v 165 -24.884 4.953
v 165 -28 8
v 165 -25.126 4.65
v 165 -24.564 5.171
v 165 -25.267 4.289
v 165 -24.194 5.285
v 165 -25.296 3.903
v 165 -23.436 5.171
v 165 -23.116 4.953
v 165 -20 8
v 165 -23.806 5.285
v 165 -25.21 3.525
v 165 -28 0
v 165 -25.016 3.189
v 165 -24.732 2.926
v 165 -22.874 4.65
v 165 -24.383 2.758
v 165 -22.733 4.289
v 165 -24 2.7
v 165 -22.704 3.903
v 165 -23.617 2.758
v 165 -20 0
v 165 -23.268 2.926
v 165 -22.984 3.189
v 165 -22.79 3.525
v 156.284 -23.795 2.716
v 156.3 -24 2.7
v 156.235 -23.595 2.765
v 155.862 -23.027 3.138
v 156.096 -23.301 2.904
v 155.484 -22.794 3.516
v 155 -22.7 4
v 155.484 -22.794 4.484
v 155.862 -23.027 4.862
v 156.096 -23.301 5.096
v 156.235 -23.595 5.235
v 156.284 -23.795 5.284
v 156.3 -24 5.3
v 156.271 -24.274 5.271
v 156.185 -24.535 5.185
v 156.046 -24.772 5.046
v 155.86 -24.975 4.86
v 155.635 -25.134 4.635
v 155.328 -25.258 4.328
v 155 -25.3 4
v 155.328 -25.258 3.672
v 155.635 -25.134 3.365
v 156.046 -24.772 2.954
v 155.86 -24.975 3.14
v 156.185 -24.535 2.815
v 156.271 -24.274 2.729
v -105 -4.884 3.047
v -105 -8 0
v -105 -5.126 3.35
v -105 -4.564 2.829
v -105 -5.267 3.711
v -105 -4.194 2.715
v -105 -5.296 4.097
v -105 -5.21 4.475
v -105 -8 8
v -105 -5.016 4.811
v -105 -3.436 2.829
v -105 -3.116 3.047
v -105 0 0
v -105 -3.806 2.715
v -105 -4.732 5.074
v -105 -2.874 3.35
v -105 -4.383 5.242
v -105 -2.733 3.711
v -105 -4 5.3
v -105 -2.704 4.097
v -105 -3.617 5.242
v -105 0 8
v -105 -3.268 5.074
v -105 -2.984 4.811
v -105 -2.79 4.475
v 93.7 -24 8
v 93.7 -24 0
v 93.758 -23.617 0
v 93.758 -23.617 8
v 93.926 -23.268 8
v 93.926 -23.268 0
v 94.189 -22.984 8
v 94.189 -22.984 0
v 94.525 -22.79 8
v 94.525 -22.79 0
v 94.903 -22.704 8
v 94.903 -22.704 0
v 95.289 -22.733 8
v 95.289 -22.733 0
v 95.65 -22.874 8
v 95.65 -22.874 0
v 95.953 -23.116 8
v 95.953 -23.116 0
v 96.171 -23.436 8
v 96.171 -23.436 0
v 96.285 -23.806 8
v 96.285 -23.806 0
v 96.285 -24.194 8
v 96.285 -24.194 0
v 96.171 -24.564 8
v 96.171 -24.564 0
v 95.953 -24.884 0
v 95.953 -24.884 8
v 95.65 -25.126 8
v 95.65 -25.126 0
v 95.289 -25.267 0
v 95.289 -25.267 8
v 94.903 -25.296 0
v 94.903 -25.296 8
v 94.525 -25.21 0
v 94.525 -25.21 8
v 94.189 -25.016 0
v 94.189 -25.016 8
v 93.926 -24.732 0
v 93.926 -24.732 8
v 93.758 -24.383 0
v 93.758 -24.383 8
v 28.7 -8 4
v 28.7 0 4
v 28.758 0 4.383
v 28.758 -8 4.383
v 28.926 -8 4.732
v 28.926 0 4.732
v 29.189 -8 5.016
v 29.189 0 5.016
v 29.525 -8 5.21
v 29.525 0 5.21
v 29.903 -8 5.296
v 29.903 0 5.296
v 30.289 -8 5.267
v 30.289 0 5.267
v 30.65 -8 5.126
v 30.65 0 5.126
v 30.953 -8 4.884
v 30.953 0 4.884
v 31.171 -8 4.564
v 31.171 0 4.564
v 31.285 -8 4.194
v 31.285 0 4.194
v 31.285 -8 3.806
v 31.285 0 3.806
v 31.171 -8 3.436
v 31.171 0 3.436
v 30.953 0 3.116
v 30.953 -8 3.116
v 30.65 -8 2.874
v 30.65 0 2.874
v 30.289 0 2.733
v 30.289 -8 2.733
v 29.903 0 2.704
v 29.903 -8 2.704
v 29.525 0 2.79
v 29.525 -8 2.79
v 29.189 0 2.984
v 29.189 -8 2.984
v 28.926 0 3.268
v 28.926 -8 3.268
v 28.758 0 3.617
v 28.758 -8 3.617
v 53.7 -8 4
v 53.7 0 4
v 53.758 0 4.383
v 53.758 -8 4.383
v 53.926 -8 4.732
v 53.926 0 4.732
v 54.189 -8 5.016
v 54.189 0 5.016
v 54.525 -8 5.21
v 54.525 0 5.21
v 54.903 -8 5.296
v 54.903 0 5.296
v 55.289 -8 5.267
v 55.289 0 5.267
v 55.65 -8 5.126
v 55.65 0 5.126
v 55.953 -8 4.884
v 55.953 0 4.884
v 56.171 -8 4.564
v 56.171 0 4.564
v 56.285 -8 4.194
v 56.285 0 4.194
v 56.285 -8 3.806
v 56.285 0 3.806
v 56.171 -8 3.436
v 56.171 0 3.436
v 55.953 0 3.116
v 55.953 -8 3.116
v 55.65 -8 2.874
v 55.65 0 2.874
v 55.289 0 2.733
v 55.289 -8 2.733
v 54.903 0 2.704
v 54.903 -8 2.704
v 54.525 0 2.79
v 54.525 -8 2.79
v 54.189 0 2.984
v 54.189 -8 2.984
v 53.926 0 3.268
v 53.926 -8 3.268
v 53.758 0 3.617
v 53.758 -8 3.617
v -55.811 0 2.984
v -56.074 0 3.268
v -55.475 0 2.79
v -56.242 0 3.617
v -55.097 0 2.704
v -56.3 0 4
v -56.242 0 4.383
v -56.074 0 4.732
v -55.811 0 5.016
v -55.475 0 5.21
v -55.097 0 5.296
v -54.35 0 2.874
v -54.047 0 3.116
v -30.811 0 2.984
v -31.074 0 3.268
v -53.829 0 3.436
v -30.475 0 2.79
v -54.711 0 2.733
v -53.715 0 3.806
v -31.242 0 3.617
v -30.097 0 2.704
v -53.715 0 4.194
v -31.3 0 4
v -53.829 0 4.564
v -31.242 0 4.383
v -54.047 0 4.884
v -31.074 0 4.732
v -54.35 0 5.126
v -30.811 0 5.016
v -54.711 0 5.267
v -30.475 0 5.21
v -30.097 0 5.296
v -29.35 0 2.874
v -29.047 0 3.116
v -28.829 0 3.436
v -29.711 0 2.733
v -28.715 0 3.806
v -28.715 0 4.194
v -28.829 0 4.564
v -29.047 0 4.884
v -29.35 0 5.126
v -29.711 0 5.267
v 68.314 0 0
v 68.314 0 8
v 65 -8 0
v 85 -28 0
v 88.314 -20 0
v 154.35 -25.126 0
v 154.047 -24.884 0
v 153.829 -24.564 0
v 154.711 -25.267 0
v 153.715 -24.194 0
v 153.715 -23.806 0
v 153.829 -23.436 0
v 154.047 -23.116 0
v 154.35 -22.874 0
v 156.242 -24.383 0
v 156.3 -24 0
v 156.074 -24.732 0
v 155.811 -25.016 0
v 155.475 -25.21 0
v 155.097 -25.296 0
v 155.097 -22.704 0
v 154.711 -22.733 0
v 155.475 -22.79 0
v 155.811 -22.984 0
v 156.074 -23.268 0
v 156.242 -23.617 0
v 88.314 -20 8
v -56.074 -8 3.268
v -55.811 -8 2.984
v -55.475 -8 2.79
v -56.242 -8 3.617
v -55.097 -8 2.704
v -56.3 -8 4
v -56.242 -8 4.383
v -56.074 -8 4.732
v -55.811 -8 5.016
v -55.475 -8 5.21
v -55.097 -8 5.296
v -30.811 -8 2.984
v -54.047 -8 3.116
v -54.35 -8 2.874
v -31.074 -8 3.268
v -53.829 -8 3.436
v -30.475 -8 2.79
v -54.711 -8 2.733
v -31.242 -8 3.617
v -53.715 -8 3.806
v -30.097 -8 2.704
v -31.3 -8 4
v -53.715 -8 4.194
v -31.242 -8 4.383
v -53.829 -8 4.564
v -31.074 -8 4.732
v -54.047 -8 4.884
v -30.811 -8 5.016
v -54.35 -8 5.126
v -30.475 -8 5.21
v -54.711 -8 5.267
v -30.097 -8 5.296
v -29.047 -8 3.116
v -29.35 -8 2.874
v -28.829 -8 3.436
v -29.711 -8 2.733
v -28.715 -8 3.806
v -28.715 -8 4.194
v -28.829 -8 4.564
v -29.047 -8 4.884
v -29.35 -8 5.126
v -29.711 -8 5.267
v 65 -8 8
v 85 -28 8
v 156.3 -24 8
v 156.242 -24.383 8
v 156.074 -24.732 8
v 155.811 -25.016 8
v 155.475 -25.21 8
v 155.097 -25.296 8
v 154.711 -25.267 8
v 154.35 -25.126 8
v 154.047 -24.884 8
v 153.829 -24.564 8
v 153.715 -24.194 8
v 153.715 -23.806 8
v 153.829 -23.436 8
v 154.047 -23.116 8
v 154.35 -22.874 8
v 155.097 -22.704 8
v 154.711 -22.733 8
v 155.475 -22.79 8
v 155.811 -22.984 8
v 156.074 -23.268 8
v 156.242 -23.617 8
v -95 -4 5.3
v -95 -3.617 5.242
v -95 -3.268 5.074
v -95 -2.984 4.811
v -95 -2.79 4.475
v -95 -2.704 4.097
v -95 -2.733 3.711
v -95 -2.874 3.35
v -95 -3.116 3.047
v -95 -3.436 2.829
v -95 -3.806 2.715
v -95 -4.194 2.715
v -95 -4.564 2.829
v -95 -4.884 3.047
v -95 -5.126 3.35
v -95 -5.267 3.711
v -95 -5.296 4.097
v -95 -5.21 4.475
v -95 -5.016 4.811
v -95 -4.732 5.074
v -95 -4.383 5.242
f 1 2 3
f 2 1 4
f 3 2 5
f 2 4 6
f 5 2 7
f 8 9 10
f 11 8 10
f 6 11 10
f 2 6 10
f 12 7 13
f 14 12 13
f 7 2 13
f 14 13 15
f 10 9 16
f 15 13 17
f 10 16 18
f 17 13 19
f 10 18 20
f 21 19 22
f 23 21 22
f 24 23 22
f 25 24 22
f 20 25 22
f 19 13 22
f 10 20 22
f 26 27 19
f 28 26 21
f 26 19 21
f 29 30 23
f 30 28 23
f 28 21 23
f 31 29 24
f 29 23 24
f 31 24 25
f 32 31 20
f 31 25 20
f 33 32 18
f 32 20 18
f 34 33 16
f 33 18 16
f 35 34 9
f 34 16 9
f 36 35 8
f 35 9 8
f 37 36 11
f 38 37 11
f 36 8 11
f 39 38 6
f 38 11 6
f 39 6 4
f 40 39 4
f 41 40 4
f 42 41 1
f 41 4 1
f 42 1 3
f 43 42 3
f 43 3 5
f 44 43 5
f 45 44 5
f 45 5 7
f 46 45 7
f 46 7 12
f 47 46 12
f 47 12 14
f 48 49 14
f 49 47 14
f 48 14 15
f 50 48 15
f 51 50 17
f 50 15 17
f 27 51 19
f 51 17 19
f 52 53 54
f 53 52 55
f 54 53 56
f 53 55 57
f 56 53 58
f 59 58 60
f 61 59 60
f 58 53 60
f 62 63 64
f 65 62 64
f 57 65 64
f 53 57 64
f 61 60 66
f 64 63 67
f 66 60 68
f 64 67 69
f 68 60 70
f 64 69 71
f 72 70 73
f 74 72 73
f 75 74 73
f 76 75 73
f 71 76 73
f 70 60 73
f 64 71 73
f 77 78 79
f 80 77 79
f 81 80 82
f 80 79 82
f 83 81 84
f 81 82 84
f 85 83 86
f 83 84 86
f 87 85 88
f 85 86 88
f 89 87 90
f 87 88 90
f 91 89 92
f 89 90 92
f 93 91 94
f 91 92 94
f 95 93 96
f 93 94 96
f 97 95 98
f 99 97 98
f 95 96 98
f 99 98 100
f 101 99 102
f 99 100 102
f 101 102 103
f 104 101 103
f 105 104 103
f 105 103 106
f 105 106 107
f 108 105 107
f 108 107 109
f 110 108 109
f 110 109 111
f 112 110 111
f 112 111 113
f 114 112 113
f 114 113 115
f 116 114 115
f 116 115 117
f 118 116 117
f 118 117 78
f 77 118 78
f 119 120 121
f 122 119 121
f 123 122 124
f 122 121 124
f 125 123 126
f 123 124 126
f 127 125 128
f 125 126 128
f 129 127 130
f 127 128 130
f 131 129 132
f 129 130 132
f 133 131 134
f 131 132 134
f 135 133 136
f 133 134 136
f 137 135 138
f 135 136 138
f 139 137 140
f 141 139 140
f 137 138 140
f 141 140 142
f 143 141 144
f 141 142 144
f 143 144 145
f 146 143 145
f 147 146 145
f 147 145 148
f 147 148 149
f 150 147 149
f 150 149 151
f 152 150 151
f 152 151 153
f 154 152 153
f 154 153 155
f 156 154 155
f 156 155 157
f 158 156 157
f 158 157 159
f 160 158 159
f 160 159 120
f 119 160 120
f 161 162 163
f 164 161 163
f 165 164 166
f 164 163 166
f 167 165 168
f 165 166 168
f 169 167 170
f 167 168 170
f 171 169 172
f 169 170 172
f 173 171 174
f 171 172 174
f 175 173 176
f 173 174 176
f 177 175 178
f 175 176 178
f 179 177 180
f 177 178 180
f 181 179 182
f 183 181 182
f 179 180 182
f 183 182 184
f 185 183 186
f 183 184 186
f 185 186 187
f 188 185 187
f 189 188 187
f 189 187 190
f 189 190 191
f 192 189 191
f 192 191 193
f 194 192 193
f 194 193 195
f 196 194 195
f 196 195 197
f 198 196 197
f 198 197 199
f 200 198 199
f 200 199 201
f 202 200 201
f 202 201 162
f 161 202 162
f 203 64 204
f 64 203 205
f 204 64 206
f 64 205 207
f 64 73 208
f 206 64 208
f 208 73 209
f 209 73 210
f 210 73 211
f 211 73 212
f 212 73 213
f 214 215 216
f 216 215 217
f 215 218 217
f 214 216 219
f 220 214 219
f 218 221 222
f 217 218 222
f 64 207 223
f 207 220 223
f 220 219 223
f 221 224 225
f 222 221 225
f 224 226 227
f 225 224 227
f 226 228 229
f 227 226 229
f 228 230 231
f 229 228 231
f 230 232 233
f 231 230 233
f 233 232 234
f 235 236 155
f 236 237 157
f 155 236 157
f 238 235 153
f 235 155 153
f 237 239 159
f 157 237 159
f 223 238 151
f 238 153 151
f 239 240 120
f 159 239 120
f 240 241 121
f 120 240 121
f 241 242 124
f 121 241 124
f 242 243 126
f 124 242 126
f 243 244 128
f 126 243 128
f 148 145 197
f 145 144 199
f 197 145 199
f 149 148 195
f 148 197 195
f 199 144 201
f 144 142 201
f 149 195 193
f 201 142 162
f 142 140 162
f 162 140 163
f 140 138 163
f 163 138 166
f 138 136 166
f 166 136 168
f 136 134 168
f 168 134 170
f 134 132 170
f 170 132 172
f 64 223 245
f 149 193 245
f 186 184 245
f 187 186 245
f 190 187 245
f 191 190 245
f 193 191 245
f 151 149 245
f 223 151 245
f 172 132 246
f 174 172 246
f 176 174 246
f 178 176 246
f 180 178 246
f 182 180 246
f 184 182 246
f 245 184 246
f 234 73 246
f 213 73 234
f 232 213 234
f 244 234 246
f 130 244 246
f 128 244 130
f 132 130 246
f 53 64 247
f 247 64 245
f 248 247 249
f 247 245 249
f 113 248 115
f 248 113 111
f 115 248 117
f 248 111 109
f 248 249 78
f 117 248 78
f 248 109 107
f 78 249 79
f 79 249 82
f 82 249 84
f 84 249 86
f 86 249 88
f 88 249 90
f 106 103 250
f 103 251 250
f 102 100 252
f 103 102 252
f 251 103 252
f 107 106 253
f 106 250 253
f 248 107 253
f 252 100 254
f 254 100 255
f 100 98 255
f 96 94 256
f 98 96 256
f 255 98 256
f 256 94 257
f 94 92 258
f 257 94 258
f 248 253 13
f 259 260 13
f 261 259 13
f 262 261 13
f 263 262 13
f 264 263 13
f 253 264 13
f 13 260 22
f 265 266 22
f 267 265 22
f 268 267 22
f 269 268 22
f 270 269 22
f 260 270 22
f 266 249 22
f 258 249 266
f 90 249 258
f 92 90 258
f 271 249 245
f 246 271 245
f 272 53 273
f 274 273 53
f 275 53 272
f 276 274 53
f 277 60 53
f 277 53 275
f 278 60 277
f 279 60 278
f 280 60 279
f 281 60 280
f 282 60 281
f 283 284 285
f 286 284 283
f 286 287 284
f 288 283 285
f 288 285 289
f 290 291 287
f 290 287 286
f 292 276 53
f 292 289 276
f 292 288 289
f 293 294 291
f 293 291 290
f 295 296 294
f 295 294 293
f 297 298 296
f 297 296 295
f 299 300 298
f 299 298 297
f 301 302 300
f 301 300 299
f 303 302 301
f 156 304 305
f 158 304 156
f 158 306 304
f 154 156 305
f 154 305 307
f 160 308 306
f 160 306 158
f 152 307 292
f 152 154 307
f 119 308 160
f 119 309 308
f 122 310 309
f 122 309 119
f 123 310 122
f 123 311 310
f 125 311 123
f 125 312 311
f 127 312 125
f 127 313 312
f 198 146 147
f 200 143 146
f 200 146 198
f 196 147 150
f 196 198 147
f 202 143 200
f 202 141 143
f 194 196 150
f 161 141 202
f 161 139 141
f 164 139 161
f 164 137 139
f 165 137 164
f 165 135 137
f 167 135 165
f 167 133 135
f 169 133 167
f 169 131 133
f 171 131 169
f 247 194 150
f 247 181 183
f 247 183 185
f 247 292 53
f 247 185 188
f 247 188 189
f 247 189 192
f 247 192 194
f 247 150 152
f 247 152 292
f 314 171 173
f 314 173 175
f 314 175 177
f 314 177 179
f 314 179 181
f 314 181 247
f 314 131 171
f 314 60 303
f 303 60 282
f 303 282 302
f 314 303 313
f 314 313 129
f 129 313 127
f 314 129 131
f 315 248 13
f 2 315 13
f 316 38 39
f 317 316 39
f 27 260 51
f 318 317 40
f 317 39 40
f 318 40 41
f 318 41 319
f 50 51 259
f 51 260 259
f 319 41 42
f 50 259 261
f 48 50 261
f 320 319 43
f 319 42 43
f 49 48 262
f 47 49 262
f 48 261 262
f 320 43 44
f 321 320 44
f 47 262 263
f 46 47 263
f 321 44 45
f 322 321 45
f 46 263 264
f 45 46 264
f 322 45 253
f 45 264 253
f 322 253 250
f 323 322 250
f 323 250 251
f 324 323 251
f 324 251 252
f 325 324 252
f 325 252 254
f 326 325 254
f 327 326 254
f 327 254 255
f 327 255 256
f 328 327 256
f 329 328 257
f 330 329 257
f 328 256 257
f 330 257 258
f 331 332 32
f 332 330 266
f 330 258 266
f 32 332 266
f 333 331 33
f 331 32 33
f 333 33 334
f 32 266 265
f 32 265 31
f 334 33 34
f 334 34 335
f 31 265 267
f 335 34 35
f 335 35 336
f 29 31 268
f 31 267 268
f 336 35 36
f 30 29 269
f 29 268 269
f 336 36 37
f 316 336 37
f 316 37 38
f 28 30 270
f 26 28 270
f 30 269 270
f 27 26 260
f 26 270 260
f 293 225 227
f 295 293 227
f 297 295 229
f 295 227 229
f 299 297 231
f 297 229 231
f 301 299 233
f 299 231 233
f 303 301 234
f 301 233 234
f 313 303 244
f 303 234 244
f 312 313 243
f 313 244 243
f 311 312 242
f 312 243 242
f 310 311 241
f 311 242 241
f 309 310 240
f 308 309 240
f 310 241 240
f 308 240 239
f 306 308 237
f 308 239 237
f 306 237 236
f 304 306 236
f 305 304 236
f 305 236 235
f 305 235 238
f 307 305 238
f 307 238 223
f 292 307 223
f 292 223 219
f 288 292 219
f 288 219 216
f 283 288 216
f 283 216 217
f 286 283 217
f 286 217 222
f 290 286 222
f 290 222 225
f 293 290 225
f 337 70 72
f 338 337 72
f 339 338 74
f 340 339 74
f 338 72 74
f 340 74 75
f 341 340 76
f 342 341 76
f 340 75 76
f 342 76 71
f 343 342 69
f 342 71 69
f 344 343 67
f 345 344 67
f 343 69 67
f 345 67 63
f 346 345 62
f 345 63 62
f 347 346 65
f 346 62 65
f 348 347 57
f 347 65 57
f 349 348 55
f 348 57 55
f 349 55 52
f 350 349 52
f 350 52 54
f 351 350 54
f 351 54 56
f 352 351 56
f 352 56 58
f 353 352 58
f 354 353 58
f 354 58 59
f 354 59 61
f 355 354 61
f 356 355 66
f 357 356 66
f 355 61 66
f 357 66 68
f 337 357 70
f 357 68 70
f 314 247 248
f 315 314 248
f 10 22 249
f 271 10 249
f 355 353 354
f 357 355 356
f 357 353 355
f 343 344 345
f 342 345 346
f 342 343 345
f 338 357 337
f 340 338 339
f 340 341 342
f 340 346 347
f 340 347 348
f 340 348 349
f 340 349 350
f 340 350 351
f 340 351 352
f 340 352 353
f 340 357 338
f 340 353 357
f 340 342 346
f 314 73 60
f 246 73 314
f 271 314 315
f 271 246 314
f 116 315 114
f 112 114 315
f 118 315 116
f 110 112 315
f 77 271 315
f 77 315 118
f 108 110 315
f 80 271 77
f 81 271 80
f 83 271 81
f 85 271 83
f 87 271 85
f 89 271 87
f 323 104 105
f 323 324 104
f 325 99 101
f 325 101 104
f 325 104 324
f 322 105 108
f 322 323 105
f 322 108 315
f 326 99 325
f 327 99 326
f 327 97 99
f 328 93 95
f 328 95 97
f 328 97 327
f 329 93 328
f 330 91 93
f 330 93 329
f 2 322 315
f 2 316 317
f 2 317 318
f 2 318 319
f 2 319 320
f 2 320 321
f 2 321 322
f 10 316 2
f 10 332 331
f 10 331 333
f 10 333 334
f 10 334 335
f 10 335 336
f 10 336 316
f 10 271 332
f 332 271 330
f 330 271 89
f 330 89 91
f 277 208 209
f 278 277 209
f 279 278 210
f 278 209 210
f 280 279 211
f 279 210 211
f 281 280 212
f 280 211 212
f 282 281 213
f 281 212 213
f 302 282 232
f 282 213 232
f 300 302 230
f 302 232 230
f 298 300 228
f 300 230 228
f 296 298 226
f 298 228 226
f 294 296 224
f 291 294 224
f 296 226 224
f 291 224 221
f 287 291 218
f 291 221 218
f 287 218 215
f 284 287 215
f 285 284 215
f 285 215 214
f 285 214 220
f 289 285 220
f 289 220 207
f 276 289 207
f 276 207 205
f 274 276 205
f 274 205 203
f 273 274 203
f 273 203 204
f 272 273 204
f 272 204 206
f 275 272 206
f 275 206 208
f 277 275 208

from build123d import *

# Parameters (mm, degrees)
SKETCH2_W           = 8
SKETCH2_H           = 130
BOSS_EXTRUDE1_DEPTH = 8
CUT_EXTRUDE1_REACH  = 67.977
SKETCH4_R           = 1.3
BOSS_EXTRUDE2_DEPTH = 8
SKETCH8_R           = 1.3
CUT_EXTRUDE3_DEPTH  = 10
CUT_EXTRUDE4_REACH  = 169.55
SKETCH9_R           = 1.3
SKETCH10_W          = 40
SKETCH10_H          = 8
BOSS_EXTRUDE3_DEPTH = 8
SKETCH11_R          = 1.3
CUT_EXTRUDE5_DEPTH  = 10


with BuildPart() as part:
    # Sketch2 → Boss-Extrude1 (new body)
    with BuildSketch(Plane(origin=(0, 0, 0), x_dir=(0, 1, 0), z_dir=(0, 0, 1))):
        with Locations((-4, 0)):
            Rectangle(SKETCH2_W, SKETCH2_H)
    extrude(amount=BOSS_EXTRUDE1_DEPTH)

    # Sketch4 → Cut-Extrude1 (cut, up to next)
    with BuildSketch(Plane(origin=(0, 0, 0), x_dir=(-1, 0, 0), z_dir=(0, 1, 0)), mode=Mode.PRIVATE) as cut_extrude1_sk1:
        with Locations((-55, 4)):
            Circle(SKETCH4_R)
    cut_extrude1_tool1 = extrude(cut_extrude1_sk1.sketch, amount=-CUT_EXTRUDE1_REACH, mode=Mode.PRIVATE) & part.part
    # Sketch4 → Cut-Extrude1 (cut, up to next)
    with BuildSketch(Plane(origin=(0, 0, 0), x_dir=(-1, 0, 0), z_dir=(0, 1, 0)), mode=Mode.PRIVATE) as cut_extrude1_sk2:
        with Locations((-30, 4)):
            Circle(SKETCH4_R)
    cut_extrude1_tool2 = extrude(cut_extrude1_sk2.sketch, amount=-CUT_EXTRUDE1_REACH, mode=Mode.PRIVATE) & part.part
    # Sketch4 → Cut-Extrude1 (cut, up to next)
    with BuildSketch(Plane(origin=(0, 0, 0), x_dir=(-1, 0, 0), z_dir=(0, 1, 0)), mode=Mode.PRIVATE) as cut_extrude1_sk3:
        with Locations((30, 4)):
            Circle(SKETCH4_R)
    cut_extrude1_tool3 = extrude(cut_extrude1_sk3.sketch, amount=-CUT_EXTRUDE1_REACH, mode=Mode.PRIVATE) & part.part
    # Sketch4 → Cut-Extrude1 (cut, up to next)
    with BuildSketch(Plane(origin=(0, 0, 0), x_dir=(-1, 0, 0), z_dir=(0, 1, 0)), mode=Mode.PRIVATE) as cut_extrude1_sk4:
        with Locations((55, 4)):
            Circle(SKETCH4_R)
    cut_extrude1_tool4 = extrude(cut_extrude1_sk4.sketch, amount=-CUT_EXTRUDE1_REACH, mode=Mode.PRIVATE) & part.part
    add(cut_extrude1_tool1.solids().sort_by_distance((55, 0, 4))[0], mode=Mode.SUBTRACT)
    add(cut_extrude1_tool2.solids().sort_by_distance((30, 0, 4))[0], mode=Mode.SUBTRACT)
    add(cut_extrude1_tool3.solids().sort_by_distance((-30, 0, 4))[0], mode=Mode.SUBTRACT)
    add(cut_extrude1_tool4.solids().sort_by_distance((-55, 0, 4))[0], mode=Mode.SUBTRACT)

    # Sketch7 → Boss-Extrude2 (add)
    with BuildSketch(Plane(origin=(0, 0, 0), x_dir=(1, 0, 0), z_dir=(0, 0, -1))):
        Polygon((65, 8), (85, 28), (165, 28), (165, 20), (88.313708499, 20), (68.313708499, 0), (65, 0), align=None)
    extrude(amount=-BOSS_EXTRUDE2_DEPTH)

    # Sketch8 → Cut-Extrude3 (cut)
    with BuildSketch(Plane.YZ.offset(165)):
        with Locations(Location((-24, 4, 0), (0, 0, 270))):
            Circle(SKETCH8_R)
    extrude(amount=-CUT_EXTRUDE3_DEPTH, mode=Mode.SUBTRACT)

    # Sketch9 → Cut-Extrude4 (cut, up to next)
    with BuildSketch(Plane(origin=(0, 0, 0), x_dir=(1, 0, 0), z_dir=(0, 0, -1)), mode=Mode.PRIVATE) as cut_extrude4_sk1:
        with Locations(Location((95, 24, 0), (0, 0, 180))):
            Circle(SKETCH9_R)
    cut_extrude4_tool1 = extrude(cut_extrude4_sk1.sketch, amount=-CUT_EXTRUDE4_REACH, mode=Mode.PRIVATE) & part.part
    # Sketch9 → Cut-Extrude4 (cut, up to next)
    with BuildSketch(Plane(origin=(0, 0, 0), x_dir=(1, 0, 0), z_dir=(0, 0, -1)), mode=Mode.PRIVATE) as cut_extrude4_sk2:
        with Locations((155, 24)):
            Circle(SKETCH9_R)
    cut_extrude4_tool2 = extrude(cut_extrude4_sk2.sketch, amount=-CUT_EXTRUDE4_REACH, mode=Mode.PRIVATE) & part.part
    add(cut_extrude4_tool1.solids().sort_by_distance((95, -24, 0))[0], mode=Mode.SUBTRACT)
    add(cut_extrude4_tool2.solids().sort_by_distance((155, -24, 0))[0], mode=Mode.SUBTRACT)

    # Sketch10 → Boss-Extrude3 (add)
    with BuildSketch(Plane.XY.offset(8)):
        with Locations((-85, -4)):
            Rectangle(SKETCH10_W, SKETCH10_H)
    extrude(amount=-BOSS_EXTRUDE3_DEPTH)

    # Sketch11 → Cut-Extrude5 (cut)
    with BuildSketch(Plane(origin=(-105, 0, 0), x_dir=(0, -1, 0), z_dir=(-1, 0, 0))):
        with Locations(Location((4, 4, 0), (0, 0, 90))):
            Circle(SKETCH11_R)
    extrude(amount=-CUT_EXTRUDE5_DEPTH, mode=Mode.SUBTRACT)


solid = part.part
